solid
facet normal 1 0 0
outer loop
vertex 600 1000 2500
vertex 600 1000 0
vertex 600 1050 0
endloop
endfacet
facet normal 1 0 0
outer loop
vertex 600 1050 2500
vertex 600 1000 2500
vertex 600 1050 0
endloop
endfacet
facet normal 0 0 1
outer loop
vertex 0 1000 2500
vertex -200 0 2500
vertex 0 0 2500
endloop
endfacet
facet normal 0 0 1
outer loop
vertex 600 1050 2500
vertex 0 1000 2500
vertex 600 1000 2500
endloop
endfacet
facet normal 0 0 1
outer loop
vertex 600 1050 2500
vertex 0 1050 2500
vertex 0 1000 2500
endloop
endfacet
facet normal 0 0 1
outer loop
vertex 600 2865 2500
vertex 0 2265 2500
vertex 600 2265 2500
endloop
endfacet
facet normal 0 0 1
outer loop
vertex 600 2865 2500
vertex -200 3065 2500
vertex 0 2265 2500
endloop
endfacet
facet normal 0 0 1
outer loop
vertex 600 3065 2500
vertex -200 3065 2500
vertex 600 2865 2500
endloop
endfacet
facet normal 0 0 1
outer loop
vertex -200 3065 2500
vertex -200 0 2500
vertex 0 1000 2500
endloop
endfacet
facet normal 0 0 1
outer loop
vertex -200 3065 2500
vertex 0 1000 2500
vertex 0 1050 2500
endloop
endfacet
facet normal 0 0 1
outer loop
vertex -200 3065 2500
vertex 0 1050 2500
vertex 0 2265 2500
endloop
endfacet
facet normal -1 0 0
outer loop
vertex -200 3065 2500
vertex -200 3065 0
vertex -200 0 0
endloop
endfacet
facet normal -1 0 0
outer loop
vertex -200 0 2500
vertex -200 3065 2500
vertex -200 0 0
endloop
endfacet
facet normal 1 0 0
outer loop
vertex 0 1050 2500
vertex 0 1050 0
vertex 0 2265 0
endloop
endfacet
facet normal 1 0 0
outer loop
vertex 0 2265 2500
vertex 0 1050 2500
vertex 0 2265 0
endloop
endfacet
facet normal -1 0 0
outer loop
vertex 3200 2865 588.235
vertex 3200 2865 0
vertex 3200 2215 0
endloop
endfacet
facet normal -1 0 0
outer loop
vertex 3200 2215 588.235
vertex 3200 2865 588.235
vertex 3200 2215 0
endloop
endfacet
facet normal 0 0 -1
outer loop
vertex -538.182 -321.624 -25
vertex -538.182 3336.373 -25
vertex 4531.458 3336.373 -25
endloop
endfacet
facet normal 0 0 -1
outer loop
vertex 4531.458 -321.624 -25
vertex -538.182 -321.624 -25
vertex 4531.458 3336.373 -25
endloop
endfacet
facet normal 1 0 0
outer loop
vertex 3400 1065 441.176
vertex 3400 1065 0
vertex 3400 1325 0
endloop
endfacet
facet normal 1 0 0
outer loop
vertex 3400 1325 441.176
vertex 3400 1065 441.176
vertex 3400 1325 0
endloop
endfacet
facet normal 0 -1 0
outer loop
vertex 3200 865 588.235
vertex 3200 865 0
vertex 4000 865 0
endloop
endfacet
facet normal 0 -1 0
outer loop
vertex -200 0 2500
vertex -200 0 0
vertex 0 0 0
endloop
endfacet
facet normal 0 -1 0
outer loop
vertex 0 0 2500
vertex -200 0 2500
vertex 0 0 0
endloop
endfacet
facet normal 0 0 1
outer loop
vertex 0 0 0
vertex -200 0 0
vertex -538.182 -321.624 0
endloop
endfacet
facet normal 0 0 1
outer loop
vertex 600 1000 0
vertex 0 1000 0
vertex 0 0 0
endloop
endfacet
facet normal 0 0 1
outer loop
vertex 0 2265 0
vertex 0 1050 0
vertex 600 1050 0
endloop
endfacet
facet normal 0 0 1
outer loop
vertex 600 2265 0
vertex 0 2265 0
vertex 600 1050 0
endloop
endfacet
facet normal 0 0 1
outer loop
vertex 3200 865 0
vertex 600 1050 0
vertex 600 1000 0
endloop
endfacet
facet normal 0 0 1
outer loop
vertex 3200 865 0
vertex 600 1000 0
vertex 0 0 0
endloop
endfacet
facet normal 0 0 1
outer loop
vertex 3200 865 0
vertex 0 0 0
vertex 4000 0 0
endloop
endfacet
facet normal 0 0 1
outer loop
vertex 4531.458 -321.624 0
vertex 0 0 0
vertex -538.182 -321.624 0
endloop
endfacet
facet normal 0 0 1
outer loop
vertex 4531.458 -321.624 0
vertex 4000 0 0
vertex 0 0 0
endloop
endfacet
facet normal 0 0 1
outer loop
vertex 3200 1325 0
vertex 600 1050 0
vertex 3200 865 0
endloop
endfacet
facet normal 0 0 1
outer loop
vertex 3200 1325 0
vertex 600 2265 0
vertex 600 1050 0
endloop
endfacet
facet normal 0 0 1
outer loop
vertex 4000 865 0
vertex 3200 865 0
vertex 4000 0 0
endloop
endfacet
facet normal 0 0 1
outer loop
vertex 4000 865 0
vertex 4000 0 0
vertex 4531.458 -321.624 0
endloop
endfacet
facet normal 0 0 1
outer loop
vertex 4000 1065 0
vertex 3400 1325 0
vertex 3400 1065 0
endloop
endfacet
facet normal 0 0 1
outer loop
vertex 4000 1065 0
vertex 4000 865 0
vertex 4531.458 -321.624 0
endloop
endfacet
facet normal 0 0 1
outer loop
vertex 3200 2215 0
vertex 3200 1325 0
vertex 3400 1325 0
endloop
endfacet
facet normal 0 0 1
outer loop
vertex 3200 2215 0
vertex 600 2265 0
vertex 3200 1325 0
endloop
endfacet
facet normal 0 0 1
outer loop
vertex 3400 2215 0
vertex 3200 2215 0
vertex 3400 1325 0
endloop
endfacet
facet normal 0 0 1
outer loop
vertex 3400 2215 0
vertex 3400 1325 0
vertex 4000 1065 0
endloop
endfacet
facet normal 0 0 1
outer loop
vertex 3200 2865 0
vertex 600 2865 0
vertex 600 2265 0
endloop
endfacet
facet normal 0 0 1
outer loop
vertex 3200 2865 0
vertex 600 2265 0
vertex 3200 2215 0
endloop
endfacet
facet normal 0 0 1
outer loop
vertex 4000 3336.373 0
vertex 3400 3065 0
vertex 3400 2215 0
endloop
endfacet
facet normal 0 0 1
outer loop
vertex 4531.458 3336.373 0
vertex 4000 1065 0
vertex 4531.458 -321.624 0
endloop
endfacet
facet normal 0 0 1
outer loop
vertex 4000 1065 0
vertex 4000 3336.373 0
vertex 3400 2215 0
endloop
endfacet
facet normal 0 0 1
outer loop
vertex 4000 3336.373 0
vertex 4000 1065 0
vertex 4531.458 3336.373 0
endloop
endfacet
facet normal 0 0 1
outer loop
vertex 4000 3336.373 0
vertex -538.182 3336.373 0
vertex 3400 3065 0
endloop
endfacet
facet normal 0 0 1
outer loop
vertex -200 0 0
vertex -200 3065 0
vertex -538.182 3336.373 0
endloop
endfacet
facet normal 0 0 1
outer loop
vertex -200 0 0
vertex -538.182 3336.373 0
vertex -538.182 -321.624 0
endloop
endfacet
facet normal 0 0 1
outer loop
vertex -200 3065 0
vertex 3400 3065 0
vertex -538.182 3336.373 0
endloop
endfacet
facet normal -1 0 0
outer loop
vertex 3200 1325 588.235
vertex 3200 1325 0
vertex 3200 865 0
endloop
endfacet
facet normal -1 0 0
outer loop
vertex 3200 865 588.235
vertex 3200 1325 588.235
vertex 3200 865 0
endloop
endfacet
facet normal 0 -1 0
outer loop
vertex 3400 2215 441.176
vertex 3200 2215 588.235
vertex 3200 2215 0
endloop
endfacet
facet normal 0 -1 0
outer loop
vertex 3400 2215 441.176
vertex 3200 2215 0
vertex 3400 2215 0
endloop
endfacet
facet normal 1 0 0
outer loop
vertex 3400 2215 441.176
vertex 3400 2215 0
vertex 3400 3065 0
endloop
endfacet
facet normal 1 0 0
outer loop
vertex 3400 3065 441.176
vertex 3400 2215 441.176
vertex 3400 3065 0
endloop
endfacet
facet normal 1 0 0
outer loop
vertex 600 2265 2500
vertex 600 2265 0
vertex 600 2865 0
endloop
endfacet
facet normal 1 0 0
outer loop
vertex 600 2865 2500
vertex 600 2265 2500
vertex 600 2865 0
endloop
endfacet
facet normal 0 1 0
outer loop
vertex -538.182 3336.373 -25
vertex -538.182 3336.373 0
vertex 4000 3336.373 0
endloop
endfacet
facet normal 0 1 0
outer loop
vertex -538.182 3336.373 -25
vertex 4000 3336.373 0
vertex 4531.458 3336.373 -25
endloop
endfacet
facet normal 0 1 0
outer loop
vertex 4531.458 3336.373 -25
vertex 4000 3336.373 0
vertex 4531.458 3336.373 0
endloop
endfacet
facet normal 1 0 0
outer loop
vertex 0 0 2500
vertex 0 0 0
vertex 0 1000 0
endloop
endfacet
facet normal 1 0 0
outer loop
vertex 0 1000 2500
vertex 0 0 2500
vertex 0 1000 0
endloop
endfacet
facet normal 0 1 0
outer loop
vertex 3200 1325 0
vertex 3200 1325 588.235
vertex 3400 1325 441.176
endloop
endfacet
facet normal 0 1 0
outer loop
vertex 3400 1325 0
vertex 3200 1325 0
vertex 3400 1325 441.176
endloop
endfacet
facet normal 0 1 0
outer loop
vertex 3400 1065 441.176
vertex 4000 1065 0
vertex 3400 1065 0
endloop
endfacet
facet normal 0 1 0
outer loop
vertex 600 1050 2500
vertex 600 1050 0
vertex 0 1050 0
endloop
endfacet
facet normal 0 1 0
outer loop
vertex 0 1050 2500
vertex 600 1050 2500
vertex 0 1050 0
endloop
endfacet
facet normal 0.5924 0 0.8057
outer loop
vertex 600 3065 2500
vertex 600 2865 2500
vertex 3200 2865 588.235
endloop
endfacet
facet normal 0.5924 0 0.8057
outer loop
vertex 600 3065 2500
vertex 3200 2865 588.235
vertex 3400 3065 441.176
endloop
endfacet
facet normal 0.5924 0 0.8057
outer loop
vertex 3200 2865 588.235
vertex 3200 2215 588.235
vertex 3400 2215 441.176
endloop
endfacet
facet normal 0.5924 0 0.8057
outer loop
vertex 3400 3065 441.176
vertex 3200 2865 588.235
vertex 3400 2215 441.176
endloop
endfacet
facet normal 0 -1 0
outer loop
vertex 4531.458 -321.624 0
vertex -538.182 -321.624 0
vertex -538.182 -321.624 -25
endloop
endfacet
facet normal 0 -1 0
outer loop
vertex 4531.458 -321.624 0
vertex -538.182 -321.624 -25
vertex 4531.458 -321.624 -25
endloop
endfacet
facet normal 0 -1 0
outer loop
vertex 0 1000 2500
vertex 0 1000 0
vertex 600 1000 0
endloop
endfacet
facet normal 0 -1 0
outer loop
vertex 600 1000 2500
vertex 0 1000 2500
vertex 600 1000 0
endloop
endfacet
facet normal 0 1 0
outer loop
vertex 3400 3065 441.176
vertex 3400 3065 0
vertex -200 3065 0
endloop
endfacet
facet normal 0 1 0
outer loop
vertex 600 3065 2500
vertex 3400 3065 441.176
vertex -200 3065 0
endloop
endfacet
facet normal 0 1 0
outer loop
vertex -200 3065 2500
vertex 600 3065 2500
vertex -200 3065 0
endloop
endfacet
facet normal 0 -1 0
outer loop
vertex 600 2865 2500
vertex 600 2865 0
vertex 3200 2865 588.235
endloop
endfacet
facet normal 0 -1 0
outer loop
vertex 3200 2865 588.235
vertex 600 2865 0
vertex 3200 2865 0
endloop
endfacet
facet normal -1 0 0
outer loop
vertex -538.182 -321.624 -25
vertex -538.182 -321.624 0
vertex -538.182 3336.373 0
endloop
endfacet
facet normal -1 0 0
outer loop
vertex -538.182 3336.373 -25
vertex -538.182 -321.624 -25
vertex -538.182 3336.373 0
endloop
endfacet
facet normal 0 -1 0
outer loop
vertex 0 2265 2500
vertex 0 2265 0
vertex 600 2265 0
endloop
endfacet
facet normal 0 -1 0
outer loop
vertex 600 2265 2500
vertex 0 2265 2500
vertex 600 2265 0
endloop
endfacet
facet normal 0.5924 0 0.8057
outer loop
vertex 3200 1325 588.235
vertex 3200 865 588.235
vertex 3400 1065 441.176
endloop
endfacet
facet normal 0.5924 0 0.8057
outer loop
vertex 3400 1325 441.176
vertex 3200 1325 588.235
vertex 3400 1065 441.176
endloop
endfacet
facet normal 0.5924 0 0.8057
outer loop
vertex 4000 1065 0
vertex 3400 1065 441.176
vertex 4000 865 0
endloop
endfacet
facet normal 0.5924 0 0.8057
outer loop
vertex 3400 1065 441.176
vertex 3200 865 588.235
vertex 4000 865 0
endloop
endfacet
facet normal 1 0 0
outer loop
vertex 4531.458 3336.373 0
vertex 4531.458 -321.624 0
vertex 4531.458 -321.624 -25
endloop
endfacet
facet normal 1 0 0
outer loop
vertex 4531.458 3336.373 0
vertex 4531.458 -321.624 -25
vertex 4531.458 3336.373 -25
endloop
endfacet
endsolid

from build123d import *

# Parameters (mm, degrees)
F2_DEPTH = 2500
F1_W     = 5069.640577
F1_H     = 3657.9974
F3_DEPTH = 25
F4_W     = 200
F4_H     = 890
F4_H_2   = 1065
F5_DEPTH = 2500
F7_DEPTH = 3336.374091


with BuildPart() as f2:
    # F0 (on Top) → F2 (new body)
    with BuildSketch(Plane.XY):
        Polygon((-200, 0), (0, 0), (0, 1000), (600, 1000), (600, 1050), (0, 1050), (0, 2265), (600, 2265), (600, 2865), (3200, 2865), (3200, 865), (4000, 865), (4000, 0), (4200, 0), (4200, 1065), (3400, 1065), (3400, 3065), (-200, 3065), align=None)
    extrude(amount=F2_DEPTH)

    # F1 (on Top) → F3 (join)
    with BuildSketch(Plane.XY):
        with Locations((1996.638089, 1507.374391)):
            Rectangle(F1_W, F1_H)
    extrude(amount=-F3_DEPTH)

    # F4 (on face) → F5 (cut, through all)
    with BuildSketch(Plane.XY.offset(2500)):
        with Locations((3300, 1770)):
            Rectangle(F4_W, F4_H)
        with Locations((4100, 532.5)):
            Rectangle(F4_W, F4_H_2)
    extrude(amount=-F5_DEPTH, mode=Mode.SUBTRACT)

    # F6 (on face) → F7 (cut, through all)
    with BuildSketch(Plane.XZ):
        Polygon((4000, 2500), (600, 2500), (4000, 0), align=None)
    extrude(amount=-F7_DEPTH, mode=Mode.SUBTRACT)


solid = f2.part
